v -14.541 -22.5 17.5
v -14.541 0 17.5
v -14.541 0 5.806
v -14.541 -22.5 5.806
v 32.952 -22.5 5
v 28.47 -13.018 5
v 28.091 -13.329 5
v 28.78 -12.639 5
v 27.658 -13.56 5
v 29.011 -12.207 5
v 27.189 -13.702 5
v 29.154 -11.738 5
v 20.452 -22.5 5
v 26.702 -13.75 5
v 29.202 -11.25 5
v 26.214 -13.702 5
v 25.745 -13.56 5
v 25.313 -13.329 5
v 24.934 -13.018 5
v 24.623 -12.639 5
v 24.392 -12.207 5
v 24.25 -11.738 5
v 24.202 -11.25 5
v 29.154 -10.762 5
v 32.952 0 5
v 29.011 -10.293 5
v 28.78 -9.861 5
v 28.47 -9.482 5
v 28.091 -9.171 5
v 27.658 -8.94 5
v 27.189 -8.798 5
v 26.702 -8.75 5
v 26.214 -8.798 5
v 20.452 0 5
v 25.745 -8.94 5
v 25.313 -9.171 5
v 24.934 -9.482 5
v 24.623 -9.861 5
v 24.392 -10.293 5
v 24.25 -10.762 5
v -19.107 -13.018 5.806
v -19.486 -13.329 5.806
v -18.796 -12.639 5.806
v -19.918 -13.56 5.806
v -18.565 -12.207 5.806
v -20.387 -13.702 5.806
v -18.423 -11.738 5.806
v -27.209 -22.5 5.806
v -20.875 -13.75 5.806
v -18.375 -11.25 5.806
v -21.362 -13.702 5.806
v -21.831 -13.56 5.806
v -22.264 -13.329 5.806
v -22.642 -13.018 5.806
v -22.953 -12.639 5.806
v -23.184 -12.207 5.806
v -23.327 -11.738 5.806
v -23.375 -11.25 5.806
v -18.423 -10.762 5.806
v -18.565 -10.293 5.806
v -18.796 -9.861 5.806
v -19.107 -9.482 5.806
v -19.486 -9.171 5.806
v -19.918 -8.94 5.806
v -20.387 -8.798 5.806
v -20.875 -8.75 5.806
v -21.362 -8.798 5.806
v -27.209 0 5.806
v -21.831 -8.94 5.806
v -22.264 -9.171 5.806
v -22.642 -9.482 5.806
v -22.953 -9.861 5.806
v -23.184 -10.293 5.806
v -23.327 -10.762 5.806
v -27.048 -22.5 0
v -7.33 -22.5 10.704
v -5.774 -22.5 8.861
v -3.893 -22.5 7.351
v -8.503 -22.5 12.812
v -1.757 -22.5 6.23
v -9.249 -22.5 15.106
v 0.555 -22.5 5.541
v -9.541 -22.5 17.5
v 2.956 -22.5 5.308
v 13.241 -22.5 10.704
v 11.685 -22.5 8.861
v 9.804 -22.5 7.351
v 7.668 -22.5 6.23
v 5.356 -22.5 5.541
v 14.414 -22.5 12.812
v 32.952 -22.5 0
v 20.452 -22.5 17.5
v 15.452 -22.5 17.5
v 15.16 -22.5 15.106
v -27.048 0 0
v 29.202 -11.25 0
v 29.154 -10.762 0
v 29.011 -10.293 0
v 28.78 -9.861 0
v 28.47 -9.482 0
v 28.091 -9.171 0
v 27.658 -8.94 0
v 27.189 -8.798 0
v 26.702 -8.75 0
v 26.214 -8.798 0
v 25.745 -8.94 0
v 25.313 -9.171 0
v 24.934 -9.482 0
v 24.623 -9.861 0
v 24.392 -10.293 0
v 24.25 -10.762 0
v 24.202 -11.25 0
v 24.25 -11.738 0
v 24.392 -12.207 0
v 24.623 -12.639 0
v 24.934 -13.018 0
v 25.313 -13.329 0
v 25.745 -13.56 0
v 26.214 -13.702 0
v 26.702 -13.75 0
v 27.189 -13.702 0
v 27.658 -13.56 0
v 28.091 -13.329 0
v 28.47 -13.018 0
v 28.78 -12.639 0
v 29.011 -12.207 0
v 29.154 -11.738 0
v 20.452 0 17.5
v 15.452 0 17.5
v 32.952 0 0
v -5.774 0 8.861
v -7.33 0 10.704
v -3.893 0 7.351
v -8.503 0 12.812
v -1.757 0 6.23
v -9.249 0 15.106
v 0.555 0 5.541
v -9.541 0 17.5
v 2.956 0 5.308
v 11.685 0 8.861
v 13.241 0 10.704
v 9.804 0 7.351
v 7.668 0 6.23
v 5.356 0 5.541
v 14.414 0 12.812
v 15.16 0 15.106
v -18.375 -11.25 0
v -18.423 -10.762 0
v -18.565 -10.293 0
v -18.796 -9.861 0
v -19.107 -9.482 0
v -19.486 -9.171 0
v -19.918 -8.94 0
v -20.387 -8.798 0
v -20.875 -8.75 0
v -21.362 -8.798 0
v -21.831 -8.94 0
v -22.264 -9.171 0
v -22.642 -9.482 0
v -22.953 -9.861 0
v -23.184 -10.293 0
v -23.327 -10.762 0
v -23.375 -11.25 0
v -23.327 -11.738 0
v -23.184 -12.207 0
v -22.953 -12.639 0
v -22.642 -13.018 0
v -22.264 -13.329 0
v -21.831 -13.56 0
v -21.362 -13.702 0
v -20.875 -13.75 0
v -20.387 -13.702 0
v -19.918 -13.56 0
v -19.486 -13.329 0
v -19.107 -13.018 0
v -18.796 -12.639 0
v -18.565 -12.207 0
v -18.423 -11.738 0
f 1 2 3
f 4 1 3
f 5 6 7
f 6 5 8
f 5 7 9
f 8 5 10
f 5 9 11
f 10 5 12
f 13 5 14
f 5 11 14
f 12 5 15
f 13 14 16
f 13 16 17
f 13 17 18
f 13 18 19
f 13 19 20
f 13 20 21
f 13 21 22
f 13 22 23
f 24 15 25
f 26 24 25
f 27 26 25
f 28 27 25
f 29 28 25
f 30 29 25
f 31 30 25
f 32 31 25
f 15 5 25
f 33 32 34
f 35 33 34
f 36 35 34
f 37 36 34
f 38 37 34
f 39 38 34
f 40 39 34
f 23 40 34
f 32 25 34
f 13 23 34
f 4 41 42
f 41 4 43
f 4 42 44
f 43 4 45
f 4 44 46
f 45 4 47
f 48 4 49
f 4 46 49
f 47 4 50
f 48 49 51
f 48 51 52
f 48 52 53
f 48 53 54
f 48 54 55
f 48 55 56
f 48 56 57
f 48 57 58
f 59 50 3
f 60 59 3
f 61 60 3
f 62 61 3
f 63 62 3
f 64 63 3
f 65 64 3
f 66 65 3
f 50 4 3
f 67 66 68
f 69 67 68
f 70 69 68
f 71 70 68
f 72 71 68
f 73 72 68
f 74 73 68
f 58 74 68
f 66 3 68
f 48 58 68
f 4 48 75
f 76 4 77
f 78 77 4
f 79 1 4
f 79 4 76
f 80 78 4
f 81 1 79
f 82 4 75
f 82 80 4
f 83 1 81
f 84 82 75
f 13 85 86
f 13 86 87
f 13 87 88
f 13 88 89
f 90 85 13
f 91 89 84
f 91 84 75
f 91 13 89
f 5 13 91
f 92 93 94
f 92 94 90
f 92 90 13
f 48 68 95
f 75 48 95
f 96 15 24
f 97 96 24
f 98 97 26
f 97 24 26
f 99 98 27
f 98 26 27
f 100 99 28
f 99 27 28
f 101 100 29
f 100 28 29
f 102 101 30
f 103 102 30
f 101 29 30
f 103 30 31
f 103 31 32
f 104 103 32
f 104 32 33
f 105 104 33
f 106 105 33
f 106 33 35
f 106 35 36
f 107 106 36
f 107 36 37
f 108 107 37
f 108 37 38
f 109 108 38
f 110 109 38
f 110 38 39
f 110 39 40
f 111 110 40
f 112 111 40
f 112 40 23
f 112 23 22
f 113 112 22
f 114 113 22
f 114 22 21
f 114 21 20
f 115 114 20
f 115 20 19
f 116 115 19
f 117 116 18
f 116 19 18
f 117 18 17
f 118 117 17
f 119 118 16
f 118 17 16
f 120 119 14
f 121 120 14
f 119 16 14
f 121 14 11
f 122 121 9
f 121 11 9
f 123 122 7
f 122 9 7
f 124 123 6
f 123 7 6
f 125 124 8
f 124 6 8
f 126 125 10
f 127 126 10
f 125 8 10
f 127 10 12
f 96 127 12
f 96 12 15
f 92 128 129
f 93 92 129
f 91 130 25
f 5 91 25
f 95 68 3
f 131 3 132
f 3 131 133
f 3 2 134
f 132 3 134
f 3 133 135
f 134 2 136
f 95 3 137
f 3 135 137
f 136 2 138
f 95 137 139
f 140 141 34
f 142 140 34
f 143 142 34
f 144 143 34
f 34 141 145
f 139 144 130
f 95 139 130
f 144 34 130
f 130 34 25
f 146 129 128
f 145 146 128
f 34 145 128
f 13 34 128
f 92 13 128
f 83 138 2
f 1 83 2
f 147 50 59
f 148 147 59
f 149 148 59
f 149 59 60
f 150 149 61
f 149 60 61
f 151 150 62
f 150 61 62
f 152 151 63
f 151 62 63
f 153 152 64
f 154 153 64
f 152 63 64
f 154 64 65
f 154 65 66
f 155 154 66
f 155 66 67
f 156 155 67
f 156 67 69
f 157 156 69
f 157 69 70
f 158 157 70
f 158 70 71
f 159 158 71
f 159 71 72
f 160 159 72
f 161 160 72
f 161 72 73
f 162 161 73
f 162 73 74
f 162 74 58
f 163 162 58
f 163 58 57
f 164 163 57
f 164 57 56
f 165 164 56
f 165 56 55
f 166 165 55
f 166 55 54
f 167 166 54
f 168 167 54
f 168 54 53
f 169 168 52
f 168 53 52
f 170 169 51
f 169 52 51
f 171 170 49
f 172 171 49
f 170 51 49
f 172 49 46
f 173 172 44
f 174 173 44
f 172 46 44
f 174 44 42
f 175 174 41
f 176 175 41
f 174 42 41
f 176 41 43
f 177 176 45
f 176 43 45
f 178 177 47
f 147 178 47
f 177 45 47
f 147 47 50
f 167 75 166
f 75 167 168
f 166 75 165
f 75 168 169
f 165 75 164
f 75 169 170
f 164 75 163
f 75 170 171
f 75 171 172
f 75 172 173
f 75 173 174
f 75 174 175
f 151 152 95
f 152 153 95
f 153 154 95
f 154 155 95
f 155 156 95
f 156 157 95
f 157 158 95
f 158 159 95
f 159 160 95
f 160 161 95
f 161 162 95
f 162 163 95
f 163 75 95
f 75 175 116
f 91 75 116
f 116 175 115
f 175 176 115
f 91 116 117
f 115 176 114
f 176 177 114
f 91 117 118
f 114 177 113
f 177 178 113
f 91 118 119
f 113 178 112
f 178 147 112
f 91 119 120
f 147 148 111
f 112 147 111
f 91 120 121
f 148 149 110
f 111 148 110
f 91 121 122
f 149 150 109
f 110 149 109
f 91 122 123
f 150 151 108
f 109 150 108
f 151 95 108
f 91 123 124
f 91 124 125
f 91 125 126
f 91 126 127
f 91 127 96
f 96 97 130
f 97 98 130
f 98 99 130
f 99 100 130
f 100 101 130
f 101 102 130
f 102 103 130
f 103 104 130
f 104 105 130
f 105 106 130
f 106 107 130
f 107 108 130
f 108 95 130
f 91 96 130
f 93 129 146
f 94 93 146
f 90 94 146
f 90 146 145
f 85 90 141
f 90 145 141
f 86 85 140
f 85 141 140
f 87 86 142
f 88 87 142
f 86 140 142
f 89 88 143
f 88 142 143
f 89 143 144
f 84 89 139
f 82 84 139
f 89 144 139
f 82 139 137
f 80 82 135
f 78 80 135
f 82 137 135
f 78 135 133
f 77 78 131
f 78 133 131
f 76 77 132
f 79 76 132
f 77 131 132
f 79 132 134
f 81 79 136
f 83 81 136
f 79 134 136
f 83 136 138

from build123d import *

# Parameters (mm, degrees)
F1_DEPTH = 22.5
F2_R     = 2.5
F3_DEPTH = 5.001
F4_R     = 2.5
F5_DEPTH = 5.807106


with BuildPart() as f1:
    # F0 (on Front) → F1 (new body)
    with BuildSketch(Plane.XZ):
        with BuildLine():
            Line((-27.208689, 5.806106), (-27.048263, 0))
            Line((-27.048263, 0), (32.951737, 0))
            Line((32.951737, 0), (32.951737, 5))
            Line((32.951737, 5), (20.451737, 5))
            Line((20.451737, 5), (20.451737, 17.5))
            Line((20.451737, 17.5), (15.451737, 17.5))
            ThreePointArc((15.451737, 17.5), (2.955538, 5.308247), (-9.540661, 17.5))
            Line((-9.540661, 17.5), (-14.540661, 17.5))
            Line((-14.540661, 17.5), (-14.540661, 5.806106))
            Line((-14.540661, 5.806106), (-14.708689, 5.806106))
            Line((-14.708689, 5.806106), (-27.208689, 5.806106))
        make_face()
    extrude(amount=F1_DEPTH)

    # F2 (on face) → F3 (cut, through all)
    with BuildSketch(Plane.XY.offset(5)):
        with Locations((26.701737, -11.25)):
            Circle(F2_R)
    extrude(amount=-F3_DEPTH, mode=Mode.SUBTRACT)

    # F4 (on face) → F5 (cut, through all)
    with BuildSketch(Plane.XY.offset(5.806106)):
        with Locations((-20.874675, -11.25)):
            Circle(F4_R)
    extrude(amount=-F5_DEPTH, mode=Mode.SUBTRACT)


solid = f1.part
